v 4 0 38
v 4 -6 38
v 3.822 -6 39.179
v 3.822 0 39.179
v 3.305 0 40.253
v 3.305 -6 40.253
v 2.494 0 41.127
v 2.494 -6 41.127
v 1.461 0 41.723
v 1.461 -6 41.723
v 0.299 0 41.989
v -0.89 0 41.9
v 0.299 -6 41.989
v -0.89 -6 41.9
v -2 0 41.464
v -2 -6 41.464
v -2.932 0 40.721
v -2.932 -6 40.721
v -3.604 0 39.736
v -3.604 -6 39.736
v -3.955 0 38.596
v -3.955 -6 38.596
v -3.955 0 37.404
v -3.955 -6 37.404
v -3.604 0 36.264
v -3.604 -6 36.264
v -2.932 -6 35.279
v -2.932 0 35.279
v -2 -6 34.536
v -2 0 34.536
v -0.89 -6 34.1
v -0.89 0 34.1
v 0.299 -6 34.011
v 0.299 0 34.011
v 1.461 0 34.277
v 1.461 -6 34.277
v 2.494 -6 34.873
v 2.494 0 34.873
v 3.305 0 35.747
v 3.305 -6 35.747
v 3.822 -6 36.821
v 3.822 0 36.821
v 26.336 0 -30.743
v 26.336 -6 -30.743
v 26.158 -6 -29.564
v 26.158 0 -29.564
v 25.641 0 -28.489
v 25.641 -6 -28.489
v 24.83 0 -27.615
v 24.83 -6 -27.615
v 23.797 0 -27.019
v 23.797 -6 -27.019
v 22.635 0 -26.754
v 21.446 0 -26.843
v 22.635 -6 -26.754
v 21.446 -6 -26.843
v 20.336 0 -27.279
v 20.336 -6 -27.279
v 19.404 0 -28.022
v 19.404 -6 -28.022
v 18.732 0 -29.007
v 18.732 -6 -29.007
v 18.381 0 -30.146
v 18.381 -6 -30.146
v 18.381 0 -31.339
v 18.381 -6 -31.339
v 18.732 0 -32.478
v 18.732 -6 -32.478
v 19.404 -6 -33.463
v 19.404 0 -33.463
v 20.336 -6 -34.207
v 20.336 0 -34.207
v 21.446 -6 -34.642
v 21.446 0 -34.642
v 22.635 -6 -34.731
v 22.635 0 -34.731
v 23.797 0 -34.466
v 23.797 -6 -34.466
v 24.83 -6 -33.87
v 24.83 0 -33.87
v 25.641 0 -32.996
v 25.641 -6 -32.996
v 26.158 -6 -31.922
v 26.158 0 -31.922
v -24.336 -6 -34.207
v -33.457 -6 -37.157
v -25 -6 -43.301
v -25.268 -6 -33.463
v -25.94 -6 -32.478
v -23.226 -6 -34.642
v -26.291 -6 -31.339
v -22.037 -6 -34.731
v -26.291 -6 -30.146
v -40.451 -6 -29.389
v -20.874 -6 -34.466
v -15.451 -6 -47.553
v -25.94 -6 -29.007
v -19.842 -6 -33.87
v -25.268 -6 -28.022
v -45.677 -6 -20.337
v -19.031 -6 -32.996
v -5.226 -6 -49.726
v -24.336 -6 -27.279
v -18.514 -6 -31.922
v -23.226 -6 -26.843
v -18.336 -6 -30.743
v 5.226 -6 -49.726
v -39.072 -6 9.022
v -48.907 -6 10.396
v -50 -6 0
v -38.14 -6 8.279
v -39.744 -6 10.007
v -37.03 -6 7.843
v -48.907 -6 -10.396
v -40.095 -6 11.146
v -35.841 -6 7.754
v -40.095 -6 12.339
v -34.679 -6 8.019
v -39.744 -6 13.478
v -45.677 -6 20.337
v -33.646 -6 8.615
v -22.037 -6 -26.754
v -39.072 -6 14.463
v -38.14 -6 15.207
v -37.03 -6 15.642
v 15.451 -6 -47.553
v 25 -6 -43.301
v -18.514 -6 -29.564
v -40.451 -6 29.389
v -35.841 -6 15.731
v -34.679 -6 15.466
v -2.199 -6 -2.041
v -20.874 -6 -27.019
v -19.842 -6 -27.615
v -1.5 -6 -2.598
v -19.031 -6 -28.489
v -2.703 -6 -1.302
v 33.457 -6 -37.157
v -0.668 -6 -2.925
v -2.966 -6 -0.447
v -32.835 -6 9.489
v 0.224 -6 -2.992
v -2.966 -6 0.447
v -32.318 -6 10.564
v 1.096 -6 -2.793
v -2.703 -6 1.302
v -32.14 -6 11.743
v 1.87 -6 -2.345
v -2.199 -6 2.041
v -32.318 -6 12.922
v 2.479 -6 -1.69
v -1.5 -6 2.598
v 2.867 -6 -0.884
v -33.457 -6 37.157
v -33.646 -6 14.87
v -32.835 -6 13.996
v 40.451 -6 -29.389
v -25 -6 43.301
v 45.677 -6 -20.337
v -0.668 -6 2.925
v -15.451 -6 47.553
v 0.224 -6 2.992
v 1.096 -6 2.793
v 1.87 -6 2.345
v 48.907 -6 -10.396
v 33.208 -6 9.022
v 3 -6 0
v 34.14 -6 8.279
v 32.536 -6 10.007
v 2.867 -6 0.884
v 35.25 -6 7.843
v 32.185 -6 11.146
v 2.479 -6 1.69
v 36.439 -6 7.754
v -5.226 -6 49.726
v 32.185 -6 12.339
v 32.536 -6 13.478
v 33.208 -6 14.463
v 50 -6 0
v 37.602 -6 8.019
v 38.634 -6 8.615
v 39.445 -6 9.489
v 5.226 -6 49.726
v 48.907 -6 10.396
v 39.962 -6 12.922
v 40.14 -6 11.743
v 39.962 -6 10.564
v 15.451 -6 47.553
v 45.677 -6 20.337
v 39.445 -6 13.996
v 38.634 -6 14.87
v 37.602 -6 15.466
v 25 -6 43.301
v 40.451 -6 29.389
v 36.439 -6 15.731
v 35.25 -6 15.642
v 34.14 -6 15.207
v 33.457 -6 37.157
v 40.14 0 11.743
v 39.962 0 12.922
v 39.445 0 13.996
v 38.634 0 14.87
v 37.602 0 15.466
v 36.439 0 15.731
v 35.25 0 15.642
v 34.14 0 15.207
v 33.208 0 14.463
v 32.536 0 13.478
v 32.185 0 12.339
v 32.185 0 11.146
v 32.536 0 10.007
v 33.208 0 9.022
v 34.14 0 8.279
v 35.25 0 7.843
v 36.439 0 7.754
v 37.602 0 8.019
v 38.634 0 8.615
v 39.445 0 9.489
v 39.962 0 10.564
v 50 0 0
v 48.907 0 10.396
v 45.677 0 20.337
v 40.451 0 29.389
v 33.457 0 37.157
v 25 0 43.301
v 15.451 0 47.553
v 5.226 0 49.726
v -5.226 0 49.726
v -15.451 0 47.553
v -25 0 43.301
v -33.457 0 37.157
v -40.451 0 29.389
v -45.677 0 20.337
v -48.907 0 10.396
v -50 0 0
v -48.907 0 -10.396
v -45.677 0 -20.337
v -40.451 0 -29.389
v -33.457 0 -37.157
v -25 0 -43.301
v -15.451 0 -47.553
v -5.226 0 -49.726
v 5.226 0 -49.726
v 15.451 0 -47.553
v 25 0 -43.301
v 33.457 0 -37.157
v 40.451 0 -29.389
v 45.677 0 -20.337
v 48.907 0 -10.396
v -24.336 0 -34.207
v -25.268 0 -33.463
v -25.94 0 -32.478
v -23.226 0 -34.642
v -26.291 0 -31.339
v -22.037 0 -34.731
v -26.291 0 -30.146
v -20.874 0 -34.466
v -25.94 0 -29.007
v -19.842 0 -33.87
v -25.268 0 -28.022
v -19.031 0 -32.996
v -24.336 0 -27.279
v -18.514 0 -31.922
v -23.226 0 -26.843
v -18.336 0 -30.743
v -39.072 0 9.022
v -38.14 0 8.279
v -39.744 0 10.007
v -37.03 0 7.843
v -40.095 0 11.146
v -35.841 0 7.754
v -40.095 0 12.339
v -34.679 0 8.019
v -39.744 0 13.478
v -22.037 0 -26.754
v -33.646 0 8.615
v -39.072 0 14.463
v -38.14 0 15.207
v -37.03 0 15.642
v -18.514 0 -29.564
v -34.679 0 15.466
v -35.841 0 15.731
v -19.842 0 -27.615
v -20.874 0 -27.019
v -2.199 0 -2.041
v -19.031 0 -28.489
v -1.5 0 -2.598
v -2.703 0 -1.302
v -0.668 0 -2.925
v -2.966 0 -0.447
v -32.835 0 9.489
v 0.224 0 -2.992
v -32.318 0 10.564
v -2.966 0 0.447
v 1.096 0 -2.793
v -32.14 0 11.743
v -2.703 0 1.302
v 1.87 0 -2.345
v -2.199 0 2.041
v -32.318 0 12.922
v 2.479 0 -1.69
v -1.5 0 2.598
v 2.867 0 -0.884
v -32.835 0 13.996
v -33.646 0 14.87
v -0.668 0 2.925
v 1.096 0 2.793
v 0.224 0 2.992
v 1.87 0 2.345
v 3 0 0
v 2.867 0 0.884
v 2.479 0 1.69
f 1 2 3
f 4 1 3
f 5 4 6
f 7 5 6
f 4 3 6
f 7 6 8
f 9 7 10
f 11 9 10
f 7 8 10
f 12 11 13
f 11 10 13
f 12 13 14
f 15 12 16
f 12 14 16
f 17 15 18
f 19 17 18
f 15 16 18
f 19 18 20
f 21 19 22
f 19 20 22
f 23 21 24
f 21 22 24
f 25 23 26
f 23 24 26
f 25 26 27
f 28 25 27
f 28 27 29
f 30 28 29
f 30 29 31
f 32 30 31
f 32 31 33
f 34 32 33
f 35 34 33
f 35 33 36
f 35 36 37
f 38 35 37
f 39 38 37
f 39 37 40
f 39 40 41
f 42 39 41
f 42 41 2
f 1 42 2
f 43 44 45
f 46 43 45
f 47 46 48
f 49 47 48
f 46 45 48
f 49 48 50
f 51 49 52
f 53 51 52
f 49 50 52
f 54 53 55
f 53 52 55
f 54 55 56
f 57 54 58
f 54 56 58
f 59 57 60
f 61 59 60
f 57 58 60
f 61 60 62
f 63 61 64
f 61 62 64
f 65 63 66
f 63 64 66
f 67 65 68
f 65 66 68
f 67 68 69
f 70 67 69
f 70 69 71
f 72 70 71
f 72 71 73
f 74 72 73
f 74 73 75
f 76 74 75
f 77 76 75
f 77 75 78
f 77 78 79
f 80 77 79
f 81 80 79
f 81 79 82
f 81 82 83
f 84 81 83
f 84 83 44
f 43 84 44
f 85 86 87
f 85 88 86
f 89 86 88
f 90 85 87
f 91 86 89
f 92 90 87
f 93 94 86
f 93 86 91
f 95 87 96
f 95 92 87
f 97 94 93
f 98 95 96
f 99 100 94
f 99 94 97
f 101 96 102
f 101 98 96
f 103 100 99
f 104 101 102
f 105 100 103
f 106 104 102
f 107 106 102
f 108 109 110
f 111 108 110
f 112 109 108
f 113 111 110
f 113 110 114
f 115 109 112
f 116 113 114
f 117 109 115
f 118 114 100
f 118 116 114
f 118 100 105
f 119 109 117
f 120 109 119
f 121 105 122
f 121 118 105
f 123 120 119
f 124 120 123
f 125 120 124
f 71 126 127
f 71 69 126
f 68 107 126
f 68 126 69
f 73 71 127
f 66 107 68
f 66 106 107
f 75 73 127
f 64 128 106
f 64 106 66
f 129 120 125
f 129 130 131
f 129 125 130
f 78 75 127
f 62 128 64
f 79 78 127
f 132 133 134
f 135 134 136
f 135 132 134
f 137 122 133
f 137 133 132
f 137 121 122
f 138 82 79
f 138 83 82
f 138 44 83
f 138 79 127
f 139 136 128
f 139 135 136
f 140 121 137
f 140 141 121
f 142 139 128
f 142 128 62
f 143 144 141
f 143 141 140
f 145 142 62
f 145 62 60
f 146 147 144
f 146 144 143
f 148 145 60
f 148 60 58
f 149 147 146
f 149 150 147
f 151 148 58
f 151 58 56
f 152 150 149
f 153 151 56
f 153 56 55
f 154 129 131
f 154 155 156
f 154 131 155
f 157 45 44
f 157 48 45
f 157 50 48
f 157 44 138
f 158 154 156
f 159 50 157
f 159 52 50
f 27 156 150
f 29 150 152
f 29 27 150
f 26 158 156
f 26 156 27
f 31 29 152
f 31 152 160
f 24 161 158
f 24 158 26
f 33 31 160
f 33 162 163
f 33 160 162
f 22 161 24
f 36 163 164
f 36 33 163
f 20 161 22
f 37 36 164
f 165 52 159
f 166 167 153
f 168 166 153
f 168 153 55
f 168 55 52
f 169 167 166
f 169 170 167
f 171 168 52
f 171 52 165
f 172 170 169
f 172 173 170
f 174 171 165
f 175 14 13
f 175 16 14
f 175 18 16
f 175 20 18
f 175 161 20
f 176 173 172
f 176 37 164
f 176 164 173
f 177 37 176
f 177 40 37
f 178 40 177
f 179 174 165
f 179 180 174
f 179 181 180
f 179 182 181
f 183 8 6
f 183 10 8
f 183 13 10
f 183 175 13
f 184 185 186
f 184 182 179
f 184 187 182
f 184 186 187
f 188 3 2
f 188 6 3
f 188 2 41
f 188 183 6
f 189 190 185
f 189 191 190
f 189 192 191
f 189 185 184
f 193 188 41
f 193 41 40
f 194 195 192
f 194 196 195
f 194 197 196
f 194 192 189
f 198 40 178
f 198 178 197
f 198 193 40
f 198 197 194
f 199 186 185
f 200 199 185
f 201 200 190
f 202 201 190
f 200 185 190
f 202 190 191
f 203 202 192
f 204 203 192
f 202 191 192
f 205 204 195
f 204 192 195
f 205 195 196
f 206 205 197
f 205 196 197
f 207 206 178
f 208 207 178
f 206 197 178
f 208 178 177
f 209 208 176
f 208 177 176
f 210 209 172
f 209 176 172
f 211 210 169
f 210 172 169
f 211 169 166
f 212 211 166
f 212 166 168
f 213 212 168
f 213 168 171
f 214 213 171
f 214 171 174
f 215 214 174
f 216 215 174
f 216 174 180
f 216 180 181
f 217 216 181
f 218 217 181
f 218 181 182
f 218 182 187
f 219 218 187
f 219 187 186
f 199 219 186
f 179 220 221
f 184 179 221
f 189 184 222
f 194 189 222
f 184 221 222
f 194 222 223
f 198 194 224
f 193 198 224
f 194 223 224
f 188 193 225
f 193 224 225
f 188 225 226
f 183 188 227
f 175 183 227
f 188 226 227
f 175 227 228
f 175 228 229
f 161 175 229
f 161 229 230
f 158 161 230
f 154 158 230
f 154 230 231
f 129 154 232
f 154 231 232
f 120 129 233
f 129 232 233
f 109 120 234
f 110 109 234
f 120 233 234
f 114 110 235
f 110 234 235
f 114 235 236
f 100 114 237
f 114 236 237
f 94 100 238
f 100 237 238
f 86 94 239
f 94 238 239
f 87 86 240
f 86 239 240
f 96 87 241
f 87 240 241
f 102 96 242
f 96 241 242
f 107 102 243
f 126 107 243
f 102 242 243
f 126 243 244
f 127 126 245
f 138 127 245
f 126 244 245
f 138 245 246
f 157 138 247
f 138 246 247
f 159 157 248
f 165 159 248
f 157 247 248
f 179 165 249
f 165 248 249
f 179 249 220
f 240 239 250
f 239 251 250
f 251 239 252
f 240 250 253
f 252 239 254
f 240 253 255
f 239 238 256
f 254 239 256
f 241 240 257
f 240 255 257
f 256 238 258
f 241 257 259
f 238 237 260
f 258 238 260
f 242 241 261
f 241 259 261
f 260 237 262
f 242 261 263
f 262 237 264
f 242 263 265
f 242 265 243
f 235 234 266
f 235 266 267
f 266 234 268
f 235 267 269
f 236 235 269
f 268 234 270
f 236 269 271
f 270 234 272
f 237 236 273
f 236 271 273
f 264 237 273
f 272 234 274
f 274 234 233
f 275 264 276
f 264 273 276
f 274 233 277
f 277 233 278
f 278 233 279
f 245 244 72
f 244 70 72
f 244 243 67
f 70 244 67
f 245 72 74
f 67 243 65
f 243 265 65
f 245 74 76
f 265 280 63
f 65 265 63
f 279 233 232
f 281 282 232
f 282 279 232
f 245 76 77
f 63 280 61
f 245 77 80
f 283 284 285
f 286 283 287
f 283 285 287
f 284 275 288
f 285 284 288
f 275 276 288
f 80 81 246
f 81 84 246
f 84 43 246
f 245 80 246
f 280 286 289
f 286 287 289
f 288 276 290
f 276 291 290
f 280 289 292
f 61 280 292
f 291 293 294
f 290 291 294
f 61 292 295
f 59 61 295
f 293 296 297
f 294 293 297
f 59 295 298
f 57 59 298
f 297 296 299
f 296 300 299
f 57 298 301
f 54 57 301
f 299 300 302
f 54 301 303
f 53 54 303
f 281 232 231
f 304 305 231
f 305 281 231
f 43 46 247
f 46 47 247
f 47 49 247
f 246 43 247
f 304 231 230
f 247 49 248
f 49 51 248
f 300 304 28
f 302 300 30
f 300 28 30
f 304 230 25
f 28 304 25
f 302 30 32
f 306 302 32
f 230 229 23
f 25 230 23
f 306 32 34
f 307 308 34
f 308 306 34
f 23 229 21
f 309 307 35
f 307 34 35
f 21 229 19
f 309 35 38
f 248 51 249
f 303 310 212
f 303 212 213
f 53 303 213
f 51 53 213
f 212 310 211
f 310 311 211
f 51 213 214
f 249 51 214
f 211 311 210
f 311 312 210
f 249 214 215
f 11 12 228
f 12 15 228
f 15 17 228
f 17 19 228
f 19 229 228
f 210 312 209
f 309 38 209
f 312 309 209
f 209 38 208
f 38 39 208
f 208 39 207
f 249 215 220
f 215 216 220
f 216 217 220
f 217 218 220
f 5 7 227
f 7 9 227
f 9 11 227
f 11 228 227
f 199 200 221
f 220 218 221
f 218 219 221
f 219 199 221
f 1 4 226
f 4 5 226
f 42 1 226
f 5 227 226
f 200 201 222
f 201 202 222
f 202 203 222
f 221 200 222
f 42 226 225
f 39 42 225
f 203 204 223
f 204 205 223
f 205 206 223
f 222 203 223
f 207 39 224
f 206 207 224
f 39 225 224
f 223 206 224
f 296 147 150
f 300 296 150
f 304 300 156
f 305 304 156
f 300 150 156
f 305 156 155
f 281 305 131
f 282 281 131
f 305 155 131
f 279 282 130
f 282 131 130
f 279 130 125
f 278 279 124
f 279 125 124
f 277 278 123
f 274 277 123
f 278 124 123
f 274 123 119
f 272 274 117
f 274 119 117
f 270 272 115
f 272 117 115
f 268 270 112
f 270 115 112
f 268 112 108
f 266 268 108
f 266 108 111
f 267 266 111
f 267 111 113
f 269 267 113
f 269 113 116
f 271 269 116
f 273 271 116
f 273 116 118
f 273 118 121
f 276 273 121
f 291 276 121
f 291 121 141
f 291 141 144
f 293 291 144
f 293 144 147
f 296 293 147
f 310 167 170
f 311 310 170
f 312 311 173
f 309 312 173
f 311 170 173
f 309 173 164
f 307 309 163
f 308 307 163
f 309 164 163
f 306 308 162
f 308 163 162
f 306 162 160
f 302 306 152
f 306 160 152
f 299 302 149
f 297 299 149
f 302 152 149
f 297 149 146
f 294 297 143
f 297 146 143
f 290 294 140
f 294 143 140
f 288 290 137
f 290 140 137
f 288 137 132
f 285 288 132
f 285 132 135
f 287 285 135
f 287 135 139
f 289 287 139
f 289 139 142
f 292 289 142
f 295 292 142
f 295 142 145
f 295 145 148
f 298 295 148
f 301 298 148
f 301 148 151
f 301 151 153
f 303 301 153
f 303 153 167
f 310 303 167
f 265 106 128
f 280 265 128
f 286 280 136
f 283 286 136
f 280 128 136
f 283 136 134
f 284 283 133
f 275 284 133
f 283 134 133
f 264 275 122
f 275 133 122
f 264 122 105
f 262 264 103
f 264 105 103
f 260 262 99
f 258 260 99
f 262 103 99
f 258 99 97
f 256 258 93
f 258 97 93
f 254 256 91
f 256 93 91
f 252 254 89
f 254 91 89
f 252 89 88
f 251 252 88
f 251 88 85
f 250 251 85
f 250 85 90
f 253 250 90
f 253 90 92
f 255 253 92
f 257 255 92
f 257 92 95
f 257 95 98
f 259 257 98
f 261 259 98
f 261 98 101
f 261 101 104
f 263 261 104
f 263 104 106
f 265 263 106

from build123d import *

# Parameters (mm, degrees)
F0_R     = 50
F1_DEPTH = 6
F2_R     = 3
F3_DEPTH = 6.001
F4_R     = 4
F5_DEPTH = 6.001


with BuildPart() as f1:
    # F0 (on Front) → F1 (new body)
    with BuildSketch(Plane.XZ):
        Circle(F0_R)
    extrude(amount=F1_DEPTH)

    # F2 (on face) → F3 (cut, through all)
    with BuildSketch(Plane.XZ.offset(6)):
        Circle(F2_R)
    extrude(amount=-F3_DEPTH, mode=Mode.SUBTRACT)

    # F4 (on face) → F5 (cut, through all)
    with BuildSketch(Plane.XZ.offset(6)):
        with Locations((0, 38)):
            Circle(F4_R)
        with Locations((-22.33584, -30.742646)):
            Circle(F4_R)
        with Locations((-36.140148, 11.742646)):
            Circle(F4_R)
        with Locations((22.33584, -30.742646)):
            Circle(F4_R)
        with Locations((36.140148, 11.742646)):
            Circle(F4_R)
    extrude(amount=-F5_DEPTH, mode=Mode.SUBTRACT)


solid = f1.part
